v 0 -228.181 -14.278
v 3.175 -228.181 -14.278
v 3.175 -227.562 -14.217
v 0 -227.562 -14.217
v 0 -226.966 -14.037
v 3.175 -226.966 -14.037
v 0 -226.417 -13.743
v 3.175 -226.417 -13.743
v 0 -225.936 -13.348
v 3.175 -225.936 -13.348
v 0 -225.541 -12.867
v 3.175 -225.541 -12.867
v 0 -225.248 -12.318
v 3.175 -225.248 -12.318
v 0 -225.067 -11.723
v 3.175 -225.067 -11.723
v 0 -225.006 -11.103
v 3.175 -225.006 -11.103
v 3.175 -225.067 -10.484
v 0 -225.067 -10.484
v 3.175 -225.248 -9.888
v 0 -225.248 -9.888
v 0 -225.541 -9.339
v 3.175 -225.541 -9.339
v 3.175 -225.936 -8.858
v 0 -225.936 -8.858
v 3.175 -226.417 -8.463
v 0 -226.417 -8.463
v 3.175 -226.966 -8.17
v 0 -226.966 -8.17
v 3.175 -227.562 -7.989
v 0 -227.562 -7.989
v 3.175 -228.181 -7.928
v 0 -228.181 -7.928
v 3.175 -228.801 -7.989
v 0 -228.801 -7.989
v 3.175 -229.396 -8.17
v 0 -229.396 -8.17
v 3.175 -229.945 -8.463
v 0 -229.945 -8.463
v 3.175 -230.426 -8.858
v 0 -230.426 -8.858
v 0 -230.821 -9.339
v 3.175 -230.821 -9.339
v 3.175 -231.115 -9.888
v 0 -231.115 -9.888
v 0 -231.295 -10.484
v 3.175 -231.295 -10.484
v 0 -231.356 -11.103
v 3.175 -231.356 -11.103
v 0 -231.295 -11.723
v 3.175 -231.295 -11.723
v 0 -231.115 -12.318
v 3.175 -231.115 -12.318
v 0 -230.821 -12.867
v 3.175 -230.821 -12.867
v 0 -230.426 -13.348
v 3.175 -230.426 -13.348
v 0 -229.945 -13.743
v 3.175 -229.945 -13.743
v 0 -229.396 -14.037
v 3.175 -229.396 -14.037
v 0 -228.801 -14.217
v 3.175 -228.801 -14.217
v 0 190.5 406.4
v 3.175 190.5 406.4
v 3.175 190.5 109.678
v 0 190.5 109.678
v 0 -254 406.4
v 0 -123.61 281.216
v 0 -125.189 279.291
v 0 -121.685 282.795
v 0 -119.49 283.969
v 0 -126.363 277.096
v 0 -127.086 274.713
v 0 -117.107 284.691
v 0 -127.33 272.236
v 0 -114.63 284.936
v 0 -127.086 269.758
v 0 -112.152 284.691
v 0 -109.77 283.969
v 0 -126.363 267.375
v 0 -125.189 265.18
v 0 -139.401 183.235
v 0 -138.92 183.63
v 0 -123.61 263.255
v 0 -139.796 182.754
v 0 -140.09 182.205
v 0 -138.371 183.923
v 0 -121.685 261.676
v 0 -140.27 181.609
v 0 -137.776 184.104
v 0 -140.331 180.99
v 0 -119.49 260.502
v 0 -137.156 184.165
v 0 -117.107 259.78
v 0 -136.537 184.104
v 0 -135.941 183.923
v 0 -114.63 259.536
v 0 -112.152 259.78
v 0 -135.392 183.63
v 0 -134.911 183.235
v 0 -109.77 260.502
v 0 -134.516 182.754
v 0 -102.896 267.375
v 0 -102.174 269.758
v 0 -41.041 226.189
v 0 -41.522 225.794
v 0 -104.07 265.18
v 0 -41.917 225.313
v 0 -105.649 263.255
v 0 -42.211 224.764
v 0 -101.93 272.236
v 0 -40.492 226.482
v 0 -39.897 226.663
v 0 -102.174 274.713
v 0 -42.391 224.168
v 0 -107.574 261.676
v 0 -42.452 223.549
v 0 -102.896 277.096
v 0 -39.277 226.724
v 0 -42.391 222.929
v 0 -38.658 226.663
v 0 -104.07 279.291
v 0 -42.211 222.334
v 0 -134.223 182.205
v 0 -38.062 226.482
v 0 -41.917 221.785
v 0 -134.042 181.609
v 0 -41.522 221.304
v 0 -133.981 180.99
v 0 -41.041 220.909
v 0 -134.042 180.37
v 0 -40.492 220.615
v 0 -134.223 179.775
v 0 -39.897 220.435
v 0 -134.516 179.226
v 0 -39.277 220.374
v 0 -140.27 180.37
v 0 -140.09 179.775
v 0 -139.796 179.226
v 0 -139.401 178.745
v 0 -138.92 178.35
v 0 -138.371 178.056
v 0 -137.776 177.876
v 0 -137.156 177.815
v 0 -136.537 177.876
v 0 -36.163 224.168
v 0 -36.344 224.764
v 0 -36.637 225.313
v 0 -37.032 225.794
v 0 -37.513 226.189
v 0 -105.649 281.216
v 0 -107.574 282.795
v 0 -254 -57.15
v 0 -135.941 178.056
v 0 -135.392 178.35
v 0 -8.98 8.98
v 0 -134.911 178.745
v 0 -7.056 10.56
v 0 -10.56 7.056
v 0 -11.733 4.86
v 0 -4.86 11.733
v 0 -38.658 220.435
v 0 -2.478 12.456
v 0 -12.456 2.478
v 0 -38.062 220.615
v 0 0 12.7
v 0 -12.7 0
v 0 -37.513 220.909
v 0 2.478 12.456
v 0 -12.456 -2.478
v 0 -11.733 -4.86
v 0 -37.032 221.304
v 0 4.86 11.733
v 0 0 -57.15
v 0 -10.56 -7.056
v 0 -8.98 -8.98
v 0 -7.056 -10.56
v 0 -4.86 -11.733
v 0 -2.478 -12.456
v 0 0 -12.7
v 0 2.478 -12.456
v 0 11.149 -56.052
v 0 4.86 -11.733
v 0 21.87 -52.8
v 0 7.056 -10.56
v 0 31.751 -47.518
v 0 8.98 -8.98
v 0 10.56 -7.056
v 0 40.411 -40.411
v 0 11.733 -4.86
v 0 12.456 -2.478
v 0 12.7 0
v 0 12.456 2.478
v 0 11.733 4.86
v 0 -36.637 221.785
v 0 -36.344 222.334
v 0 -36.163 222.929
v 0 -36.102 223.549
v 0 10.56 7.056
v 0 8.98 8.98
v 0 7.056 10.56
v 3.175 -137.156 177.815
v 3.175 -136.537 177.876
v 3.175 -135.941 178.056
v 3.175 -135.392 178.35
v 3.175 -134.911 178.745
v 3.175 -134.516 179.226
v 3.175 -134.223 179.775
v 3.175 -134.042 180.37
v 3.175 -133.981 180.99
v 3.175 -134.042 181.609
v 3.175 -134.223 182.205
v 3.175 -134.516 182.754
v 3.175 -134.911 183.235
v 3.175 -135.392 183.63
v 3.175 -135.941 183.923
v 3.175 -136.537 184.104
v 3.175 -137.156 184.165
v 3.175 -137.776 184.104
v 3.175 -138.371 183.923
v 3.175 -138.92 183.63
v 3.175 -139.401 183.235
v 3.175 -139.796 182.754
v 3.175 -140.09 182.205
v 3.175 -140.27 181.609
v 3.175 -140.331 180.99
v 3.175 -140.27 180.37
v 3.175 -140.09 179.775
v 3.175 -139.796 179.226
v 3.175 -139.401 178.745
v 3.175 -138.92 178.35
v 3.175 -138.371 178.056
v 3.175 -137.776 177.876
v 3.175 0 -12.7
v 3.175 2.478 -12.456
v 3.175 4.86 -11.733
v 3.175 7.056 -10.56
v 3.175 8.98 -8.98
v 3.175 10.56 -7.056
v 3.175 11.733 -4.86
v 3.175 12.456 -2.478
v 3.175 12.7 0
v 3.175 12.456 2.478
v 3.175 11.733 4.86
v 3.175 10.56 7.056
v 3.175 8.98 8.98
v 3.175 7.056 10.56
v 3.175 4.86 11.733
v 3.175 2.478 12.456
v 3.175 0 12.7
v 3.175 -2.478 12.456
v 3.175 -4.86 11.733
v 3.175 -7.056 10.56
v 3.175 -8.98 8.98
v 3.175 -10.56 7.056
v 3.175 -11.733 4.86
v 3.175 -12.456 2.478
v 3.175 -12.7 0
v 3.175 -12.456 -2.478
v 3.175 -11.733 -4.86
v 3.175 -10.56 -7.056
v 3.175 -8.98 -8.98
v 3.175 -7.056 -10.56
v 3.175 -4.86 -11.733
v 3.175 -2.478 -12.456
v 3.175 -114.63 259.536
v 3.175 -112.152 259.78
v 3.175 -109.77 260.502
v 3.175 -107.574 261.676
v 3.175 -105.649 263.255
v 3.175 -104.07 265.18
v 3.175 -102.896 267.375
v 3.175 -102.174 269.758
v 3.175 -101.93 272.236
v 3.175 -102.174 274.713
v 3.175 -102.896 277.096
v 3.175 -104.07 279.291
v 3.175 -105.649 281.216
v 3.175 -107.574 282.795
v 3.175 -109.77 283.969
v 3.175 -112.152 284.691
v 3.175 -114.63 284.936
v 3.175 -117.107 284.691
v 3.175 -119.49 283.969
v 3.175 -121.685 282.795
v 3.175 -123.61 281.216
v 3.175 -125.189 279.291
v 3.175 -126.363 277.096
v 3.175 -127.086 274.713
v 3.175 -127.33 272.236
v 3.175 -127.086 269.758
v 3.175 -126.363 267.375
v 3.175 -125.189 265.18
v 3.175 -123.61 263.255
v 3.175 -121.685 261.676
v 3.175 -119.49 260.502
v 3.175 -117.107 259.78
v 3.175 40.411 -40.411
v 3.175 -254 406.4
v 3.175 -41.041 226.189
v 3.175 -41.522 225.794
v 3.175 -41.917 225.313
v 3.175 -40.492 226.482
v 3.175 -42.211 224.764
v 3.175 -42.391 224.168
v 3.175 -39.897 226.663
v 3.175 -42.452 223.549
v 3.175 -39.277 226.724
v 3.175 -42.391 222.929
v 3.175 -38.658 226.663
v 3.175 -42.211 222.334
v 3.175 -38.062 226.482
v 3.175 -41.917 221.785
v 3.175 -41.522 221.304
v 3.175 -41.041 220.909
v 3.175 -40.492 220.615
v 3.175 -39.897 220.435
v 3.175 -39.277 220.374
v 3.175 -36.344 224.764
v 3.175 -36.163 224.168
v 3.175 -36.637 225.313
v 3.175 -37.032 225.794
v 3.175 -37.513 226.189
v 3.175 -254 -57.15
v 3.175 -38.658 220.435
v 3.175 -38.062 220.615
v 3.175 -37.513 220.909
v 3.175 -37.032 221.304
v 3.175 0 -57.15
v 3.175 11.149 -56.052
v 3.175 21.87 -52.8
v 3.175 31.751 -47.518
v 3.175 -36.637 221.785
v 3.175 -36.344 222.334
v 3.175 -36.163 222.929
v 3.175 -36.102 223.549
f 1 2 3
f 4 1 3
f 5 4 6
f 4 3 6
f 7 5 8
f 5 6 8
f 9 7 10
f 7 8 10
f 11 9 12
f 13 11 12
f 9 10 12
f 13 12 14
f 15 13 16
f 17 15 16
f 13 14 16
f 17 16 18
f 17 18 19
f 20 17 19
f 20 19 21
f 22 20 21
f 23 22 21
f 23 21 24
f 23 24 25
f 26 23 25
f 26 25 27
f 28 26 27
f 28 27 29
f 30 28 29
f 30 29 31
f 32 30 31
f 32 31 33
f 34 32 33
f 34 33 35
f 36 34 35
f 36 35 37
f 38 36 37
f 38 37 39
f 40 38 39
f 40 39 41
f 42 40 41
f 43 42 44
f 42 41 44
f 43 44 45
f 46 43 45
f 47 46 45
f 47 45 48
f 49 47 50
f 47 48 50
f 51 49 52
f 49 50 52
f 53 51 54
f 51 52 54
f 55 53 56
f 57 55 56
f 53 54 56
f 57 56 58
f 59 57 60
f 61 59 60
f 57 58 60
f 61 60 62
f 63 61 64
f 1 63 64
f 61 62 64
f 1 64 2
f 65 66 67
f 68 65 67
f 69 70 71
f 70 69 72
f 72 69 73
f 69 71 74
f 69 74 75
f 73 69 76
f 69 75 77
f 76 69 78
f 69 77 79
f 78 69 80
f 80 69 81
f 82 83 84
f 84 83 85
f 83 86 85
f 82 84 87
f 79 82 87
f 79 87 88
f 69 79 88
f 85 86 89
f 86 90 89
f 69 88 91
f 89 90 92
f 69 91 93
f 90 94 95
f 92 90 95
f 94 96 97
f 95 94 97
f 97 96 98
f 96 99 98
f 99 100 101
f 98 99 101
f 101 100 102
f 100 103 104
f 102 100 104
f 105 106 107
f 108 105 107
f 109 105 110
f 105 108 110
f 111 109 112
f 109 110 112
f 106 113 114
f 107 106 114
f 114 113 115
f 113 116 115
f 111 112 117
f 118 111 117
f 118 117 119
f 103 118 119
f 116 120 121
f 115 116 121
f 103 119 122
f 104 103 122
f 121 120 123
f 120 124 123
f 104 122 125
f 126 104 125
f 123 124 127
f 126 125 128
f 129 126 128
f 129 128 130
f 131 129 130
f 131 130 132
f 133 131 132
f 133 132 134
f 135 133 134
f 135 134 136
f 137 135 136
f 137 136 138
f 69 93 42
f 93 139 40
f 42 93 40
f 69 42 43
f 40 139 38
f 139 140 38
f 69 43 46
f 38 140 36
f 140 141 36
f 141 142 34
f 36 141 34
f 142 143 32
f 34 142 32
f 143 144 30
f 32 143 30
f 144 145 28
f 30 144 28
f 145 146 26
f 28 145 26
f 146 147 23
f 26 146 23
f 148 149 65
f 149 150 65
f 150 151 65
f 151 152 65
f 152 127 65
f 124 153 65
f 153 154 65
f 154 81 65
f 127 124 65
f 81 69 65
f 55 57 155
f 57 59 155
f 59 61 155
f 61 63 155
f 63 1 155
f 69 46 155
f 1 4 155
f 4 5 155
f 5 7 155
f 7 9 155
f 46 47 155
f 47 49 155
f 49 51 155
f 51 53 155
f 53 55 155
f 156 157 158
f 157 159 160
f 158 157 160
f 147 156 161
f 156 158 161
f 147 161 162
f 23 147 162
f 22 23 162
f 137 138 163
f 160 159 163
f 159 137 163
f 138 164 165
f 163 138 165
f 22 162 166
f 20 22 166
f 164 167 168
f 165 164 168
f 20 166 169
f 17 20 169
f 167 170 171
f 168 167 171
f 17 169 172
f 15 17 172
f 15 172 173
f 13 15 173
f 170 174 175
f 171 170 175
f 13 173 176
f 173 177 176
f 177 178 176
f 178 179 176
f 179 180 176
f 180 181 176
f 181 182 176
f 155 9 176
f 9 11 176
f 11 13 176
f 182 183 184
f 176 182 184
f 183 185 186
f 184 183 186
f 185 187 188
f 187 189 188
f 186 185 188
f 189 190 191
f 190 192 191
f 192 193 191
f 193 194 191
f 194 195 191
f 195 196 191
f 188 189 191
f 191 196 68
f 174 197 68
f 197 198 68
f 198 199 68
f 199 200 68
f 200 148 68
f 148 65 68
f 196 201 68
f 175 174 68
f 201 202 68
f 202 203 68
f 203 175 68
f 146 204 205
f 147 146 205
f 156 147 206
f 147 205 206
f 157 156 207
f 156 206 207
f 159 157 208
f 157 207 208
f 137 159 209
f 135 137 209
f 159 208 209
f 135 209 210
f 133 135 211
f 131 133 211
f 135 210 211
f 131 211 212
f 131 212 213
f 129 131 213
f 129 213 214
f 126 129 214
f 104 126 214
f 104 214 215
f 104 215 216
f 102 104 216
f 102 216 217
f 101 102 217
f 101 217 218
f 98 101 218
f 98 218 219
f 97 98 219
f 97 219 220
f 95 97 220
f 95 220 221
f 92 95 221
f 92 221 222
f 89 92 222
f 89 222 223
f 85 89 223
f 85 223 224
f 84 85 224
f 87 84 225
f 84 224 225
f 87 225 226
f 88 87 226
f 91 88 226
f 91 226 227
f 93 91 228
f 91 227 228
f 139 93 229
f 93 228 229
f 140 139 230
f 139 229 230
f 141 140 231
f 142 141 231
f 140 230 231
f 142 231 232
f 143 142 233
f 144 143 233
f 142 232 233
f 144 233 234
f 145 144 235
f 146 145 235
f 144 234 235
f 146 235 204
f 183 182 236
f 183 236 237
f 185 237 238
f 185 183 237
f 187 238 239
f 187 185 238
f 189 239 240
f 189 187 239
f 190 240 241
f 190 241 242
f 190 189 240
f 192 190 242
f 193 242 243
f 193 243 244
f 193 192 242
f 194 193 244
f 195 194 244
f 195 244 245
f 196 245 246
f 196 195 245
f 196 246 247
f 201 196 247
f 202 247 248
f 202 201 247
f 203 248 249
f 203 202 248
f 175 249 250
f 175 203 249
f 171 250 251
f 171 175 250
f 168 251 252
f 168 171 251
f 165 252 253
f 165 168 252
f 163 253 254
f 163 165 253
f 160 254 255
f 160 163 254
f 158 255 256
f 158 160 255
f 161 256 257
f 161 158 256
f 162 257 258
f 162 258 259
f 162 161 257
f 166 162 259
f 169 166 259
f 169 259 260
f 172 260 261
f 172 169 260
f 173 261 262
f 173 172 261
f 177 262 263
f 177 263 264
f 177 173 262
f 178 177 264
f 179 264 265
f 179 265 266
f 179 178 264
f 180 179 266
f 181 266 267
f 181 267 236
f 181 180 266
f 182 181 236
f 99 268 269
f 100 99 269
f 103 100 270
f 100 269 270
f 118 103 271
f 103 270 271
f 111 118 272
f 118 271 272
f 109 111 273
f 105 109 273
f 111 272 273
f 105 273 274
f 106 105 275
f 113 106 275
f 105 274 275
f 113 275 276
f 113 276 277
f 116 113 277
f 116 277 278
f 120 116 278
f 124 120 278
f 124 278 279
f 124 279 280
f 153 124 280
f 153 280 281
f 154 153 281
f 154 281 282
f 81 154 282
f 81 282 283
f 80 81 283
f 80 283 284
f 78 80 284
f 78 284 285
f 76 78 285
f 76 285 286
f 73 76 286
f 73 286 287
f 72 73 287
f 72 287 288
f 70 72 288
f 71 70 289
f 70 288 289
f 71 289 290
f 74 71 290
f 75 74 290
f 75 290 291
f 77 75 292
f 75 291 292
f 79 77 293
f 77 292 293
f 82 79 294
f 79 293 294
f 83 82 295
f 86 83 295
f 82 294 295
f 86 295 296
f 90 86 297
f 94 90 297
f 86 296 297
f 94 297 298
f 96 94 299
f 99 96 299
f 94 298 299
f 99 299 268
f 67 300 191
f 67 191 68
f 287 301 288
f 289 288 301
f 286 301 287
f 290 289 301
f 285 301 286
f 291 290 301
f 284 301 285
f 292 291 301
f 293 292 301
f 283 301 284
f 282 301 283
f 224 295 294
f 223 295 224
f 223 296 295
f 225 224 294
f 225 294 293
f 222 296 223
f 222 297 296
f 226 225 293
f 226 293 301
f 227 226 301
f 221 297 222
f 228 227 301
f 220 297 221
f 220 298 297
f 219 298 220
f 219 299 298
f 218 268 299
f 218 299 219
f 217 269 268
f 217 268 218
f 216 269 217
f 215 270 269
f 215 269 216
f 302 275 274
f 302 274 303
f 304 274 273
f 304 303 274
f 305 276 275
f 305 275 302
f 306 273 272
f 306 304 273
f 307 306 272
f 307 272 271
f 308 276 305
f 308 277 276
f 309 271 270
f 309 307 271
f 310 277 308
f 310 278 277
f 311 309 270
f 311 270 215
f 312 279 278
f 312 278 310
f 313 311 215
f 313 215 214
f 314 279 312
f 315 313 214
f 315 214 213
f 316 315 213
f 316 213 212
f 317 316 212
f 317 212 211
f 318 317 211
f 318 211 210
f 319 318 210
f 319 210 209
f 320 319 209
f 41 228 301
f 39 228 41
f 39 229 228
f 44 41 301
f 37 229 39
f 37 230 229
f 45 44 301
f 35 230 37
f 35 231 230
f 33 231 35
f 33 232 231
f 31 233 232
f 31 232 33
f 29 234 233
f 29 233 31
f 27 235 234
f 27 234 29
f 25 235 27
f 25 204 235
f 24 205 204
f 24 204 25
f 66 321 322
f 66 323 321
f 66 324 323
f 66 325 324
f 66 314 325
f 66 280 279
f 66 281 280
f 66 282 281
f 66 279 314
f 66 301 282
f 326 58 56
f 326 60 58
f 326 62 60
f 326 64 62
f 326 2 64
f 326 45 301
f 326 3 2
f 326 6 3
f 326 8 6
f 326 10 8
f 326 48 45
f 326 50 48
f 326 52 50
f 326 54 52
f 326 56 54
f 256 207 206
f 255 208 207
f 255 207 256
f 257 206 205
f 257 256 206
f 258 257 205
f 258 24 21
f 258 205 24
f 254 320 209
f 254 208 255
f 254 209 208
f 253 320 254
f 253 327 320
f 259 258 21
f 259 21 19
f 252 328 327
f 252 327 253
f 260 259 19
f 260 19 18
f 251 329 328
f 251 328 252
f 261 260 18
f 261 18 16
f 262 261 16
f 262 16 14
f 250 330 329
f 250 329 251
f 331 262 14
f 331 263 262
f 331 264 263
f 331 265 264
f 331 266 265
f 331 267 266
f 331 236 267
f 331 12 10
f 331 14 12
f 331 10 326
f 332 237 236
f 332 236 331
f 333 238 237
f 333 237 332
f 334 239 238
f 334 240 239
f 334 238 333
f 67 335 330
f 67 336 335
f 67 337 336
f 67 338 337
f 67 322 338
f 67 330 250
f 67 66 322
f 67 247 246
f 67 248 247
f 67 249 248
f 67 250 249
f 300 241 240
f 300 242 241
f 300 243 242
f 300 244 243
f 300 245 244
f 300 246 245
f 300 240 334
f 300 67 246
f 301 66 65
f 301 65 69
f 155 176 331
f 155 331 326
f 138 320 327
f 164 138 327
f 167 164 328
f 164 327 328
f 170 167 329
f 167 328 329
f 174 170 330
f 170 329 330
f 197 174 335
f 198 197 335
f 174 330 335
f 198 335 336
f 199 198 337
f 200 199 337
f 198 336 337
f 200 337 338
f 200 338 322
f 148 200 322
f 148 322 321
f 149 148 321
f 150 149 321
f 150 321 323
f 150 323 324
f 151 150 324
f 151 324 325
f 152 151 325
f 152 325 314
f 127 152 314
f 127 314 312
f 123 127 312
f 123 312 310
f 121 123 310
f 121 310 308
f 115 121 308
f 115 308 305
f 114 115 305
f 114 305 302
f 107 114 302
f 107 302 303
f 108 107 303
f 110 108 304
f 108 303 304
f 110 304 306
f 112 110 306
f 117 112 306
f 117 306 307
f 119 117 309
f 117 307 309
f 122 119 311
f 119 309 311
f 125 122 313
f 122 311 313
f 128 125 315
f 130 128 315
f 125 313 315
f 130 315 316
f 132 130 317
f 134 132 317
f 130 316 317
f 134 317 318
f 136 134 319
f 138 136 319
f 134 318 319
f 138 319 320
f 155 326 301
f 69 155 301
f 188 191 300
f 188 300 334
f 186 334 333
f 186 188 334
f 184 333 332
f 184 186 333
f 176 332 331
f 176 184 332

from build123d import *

# Parameters (mm, degrees)
SKETCH1_R           = 12.7
BOSS_EXTRUDE1_DEPTH = 3.175
CUT_EXTRUDE1_REACH  = 5.175
SKETCH2_R           = 3.175
BOSS_EXTRUDE2_DEPTH = 3.175
BOSS_EXTRUDE3_DEPTH = 3.175
CUT_EXTRUDE2_REACH  = 5.175
SKETCH5_R           = 12.7
BOSS_EXTRUDE4_DEPTH = 3.175
SKETCH7_W           = 739.335123301
SKETCH7_H           = 711.050730063
CUT_EXTRUDE3_DEPTH  = 3.175


with BuildPart() as part:
    # Sketch1 → Boss-Extrude1 (new body)
    with BuildSketch(Plane(origin=(0, 0, 0), x_dir=(0, 0, -1), z_dir=(1, 0, 0))):
        with BuildLine():
            Line((-217.899389282, 130.521477737), (17.58316119, 54.3778902))
            ThreePointArc((17.58316119, 54.3778902), (46.211471314, 33.624729277), (57.15, 0))
            Line((57.15, 0), (57.15, -254))
            Line((57.15, -254), (0, -254))
            ThreePointArc((0, -254), (-220.984677461, -125.226883405), (-217.899389282, 130.521477737))
        make_face()
        Circle(SKETCH1_R, mode=Mode.SUBTRACT)
    extrude(amount=BOSS_EXTRUDE1_DEPTH)

    # Sketch2 → Cut-Extrude1 (cut, up to next)
    with BuildSketch(Plane(origin=(3.175, 0, 0), x_dir=(0, 0, -1), z_dir=(1, 0, 0)), mode=Mode.PRIVATE) as cut_extrude1_sk1:
        with Locations((11.103289152, -228.181271676)):
            Circle(SKETCH2_R)
    cut_extrude1_tool1 = extrude(cut_extrude1_sk1.sketch, amount=-CUT_EXTRUDE1_REACH, mode=Mode.PRIVATE) & part.part
    add(cut_extrude1_tool1.solids().sort_by_distance((3.175, -228.181272, -11.103289))[0], mode=Mode.SUBTRACT)
    # Sketch2 → Cut-Extrude1 (cut, up to next)
    with BuildSketch(Plane(origin=(3.175, 0, 0), x_dir=(0, 0, -1), z_dir=(1, 0, 0)), mode=Mode.PRIVATE) as cut_extrude1_sk2:
        with Locations((-180.989788445, -137.156185968)):
            Circle(SKETCH2_R)
    cut_extrude1_tool2 = extrude(cut_extrude1_sk2.sketch, amount=-CUT_EXTRUDE1_REACH, mode=Mode.PRIVATE) & part.part
    add(cut_extrude1_tool2.solids().sort_by_distance((3.175, -137.156186, 180.989788))[0], mode=Mode.SUBTRACT)
    # Sketch2 → Cut-Extrude1 (cut, up to next)
    with BuildSketch(Plane(origin=(3.175, 0, 0), x_dir=(0, 0, -1), z_dir=(1, 0, 0)), mode=Mode.PRIVATE) as cut_extrude1_sk3:
        with Locations((-223.548763187, -39.27724509)):
            Circle(SKETCH2_R)
    cut_extrude1_tool3 = extrude(cut_extrude1_sk3.sketch, amount=-CUT_EXTRUDE1_REACH, mode=Mode.PRIVATE) & part.part
    add(cut_extrude1_tool3.solids().sort_by_distance((3.175, -39.277245, 223.548763))[0], mode=Mode.SUBTRACT)

    # Sketch3 → Boss-Extrude2 (add)
    with BuildSketch(Plane(origin=(3.175, 0, 0), x_dir=(0, 0, -1), z_dir=(1, 0, 0))):
        with BuildLine():
            Line((0, -254), (-254, -254))
            Line((-254, -254), (-254, 0))
            ThreePointArc((-254, 0), (-179.605122421, -179.605122421), (0, -254))
        make_face()
    extrude(amount=-BOSS_EXTRUDE2_DEPTH)

    # Sketch4 → Boss-Extrude3 (add)
    with BuildSketch(Plane(origin=(3.175, 0, 0), x_dir=(0, 0, -1), z_dir=(1, 0, 0))):
        with BuildLine():
            Line((-254, -254), (-406.4, -254))
            Line((-406.4, -254), (-406.4, 191.473394235))
            Line((-406.4, 191.473394235), (-217.899389282, 130.521477737))
            ThreePointArc((-217.899389282, 130.521477737), (-244.808542414, 67.710985528), (-254, 0))
            Line((-254, 0), (-254, -254))
        make_face()
    extrude(amount=-BOSS_EXTRUDE3_DEPTH)

    # Sketch5 → Cut-Extrude2 (cut, up to next)
    with BuildSketch(Plane(origin=(3.175, 0, 0), x_dir=(0, 0, -1), z_dir=(1, 0, 0)), mode=Mode.PRIVATE) as cut_extrude2_sk1:
        with Locations((-272.235522473, -114.629596607)):
            Circle(SKETCH5_R)
    cut_extrude2_tool1 = extrude(cut_extrude2_sk1.sketch, amount=-CUT_EXTRUDE2_REACH, mode=Mode.PRIVATE) & part.part
    add(cut_extrude2_tool1.solids().sort_by_distance((3.175, -114.629597, 272.235522))[0], mode=Mode.SUBTRACT)

    # Sketch6 → Boss-Extrude4 (add)
    with BuildSketch(Plane(origin=(3.175, 0, 0), x_dir=(0, 0, -1), z_dir=(1, 0, 0))):
        with BuildLine():
            Line((40.411152545, 40.411152545), (-406.4, 487.22230509))
            Line((-406.4, 487.22230509), (-406.4, 191.473394235))
            Line((-406.4, 191.473394235), (17.58316119, 54.3778902))
            ThreePointArc((17.58316119, 54.3778902), (29.826205702, 48.749563623), (40.411152545, 40.411152545))
        make_face()
    extrude(amount=-BOSS_EXTRUDE4_DEPTH)

    # Sketch7 → Cut-Extrude3 (cut)
    with BuildSketch(Plane(origin=(3.175, 0, 0), x_dir=(0, 0, -1), z_dir=(1, 0, 0))):
        with Locations((-36.73243835, 546.025365032)):
            Rectangle(SKETCH7_W, SKETCH7_H)
    extrude(amount=-CUT_EXTRUDE3_DEPTH, mode=Mode.SUBTRACT)


solid = part.part
